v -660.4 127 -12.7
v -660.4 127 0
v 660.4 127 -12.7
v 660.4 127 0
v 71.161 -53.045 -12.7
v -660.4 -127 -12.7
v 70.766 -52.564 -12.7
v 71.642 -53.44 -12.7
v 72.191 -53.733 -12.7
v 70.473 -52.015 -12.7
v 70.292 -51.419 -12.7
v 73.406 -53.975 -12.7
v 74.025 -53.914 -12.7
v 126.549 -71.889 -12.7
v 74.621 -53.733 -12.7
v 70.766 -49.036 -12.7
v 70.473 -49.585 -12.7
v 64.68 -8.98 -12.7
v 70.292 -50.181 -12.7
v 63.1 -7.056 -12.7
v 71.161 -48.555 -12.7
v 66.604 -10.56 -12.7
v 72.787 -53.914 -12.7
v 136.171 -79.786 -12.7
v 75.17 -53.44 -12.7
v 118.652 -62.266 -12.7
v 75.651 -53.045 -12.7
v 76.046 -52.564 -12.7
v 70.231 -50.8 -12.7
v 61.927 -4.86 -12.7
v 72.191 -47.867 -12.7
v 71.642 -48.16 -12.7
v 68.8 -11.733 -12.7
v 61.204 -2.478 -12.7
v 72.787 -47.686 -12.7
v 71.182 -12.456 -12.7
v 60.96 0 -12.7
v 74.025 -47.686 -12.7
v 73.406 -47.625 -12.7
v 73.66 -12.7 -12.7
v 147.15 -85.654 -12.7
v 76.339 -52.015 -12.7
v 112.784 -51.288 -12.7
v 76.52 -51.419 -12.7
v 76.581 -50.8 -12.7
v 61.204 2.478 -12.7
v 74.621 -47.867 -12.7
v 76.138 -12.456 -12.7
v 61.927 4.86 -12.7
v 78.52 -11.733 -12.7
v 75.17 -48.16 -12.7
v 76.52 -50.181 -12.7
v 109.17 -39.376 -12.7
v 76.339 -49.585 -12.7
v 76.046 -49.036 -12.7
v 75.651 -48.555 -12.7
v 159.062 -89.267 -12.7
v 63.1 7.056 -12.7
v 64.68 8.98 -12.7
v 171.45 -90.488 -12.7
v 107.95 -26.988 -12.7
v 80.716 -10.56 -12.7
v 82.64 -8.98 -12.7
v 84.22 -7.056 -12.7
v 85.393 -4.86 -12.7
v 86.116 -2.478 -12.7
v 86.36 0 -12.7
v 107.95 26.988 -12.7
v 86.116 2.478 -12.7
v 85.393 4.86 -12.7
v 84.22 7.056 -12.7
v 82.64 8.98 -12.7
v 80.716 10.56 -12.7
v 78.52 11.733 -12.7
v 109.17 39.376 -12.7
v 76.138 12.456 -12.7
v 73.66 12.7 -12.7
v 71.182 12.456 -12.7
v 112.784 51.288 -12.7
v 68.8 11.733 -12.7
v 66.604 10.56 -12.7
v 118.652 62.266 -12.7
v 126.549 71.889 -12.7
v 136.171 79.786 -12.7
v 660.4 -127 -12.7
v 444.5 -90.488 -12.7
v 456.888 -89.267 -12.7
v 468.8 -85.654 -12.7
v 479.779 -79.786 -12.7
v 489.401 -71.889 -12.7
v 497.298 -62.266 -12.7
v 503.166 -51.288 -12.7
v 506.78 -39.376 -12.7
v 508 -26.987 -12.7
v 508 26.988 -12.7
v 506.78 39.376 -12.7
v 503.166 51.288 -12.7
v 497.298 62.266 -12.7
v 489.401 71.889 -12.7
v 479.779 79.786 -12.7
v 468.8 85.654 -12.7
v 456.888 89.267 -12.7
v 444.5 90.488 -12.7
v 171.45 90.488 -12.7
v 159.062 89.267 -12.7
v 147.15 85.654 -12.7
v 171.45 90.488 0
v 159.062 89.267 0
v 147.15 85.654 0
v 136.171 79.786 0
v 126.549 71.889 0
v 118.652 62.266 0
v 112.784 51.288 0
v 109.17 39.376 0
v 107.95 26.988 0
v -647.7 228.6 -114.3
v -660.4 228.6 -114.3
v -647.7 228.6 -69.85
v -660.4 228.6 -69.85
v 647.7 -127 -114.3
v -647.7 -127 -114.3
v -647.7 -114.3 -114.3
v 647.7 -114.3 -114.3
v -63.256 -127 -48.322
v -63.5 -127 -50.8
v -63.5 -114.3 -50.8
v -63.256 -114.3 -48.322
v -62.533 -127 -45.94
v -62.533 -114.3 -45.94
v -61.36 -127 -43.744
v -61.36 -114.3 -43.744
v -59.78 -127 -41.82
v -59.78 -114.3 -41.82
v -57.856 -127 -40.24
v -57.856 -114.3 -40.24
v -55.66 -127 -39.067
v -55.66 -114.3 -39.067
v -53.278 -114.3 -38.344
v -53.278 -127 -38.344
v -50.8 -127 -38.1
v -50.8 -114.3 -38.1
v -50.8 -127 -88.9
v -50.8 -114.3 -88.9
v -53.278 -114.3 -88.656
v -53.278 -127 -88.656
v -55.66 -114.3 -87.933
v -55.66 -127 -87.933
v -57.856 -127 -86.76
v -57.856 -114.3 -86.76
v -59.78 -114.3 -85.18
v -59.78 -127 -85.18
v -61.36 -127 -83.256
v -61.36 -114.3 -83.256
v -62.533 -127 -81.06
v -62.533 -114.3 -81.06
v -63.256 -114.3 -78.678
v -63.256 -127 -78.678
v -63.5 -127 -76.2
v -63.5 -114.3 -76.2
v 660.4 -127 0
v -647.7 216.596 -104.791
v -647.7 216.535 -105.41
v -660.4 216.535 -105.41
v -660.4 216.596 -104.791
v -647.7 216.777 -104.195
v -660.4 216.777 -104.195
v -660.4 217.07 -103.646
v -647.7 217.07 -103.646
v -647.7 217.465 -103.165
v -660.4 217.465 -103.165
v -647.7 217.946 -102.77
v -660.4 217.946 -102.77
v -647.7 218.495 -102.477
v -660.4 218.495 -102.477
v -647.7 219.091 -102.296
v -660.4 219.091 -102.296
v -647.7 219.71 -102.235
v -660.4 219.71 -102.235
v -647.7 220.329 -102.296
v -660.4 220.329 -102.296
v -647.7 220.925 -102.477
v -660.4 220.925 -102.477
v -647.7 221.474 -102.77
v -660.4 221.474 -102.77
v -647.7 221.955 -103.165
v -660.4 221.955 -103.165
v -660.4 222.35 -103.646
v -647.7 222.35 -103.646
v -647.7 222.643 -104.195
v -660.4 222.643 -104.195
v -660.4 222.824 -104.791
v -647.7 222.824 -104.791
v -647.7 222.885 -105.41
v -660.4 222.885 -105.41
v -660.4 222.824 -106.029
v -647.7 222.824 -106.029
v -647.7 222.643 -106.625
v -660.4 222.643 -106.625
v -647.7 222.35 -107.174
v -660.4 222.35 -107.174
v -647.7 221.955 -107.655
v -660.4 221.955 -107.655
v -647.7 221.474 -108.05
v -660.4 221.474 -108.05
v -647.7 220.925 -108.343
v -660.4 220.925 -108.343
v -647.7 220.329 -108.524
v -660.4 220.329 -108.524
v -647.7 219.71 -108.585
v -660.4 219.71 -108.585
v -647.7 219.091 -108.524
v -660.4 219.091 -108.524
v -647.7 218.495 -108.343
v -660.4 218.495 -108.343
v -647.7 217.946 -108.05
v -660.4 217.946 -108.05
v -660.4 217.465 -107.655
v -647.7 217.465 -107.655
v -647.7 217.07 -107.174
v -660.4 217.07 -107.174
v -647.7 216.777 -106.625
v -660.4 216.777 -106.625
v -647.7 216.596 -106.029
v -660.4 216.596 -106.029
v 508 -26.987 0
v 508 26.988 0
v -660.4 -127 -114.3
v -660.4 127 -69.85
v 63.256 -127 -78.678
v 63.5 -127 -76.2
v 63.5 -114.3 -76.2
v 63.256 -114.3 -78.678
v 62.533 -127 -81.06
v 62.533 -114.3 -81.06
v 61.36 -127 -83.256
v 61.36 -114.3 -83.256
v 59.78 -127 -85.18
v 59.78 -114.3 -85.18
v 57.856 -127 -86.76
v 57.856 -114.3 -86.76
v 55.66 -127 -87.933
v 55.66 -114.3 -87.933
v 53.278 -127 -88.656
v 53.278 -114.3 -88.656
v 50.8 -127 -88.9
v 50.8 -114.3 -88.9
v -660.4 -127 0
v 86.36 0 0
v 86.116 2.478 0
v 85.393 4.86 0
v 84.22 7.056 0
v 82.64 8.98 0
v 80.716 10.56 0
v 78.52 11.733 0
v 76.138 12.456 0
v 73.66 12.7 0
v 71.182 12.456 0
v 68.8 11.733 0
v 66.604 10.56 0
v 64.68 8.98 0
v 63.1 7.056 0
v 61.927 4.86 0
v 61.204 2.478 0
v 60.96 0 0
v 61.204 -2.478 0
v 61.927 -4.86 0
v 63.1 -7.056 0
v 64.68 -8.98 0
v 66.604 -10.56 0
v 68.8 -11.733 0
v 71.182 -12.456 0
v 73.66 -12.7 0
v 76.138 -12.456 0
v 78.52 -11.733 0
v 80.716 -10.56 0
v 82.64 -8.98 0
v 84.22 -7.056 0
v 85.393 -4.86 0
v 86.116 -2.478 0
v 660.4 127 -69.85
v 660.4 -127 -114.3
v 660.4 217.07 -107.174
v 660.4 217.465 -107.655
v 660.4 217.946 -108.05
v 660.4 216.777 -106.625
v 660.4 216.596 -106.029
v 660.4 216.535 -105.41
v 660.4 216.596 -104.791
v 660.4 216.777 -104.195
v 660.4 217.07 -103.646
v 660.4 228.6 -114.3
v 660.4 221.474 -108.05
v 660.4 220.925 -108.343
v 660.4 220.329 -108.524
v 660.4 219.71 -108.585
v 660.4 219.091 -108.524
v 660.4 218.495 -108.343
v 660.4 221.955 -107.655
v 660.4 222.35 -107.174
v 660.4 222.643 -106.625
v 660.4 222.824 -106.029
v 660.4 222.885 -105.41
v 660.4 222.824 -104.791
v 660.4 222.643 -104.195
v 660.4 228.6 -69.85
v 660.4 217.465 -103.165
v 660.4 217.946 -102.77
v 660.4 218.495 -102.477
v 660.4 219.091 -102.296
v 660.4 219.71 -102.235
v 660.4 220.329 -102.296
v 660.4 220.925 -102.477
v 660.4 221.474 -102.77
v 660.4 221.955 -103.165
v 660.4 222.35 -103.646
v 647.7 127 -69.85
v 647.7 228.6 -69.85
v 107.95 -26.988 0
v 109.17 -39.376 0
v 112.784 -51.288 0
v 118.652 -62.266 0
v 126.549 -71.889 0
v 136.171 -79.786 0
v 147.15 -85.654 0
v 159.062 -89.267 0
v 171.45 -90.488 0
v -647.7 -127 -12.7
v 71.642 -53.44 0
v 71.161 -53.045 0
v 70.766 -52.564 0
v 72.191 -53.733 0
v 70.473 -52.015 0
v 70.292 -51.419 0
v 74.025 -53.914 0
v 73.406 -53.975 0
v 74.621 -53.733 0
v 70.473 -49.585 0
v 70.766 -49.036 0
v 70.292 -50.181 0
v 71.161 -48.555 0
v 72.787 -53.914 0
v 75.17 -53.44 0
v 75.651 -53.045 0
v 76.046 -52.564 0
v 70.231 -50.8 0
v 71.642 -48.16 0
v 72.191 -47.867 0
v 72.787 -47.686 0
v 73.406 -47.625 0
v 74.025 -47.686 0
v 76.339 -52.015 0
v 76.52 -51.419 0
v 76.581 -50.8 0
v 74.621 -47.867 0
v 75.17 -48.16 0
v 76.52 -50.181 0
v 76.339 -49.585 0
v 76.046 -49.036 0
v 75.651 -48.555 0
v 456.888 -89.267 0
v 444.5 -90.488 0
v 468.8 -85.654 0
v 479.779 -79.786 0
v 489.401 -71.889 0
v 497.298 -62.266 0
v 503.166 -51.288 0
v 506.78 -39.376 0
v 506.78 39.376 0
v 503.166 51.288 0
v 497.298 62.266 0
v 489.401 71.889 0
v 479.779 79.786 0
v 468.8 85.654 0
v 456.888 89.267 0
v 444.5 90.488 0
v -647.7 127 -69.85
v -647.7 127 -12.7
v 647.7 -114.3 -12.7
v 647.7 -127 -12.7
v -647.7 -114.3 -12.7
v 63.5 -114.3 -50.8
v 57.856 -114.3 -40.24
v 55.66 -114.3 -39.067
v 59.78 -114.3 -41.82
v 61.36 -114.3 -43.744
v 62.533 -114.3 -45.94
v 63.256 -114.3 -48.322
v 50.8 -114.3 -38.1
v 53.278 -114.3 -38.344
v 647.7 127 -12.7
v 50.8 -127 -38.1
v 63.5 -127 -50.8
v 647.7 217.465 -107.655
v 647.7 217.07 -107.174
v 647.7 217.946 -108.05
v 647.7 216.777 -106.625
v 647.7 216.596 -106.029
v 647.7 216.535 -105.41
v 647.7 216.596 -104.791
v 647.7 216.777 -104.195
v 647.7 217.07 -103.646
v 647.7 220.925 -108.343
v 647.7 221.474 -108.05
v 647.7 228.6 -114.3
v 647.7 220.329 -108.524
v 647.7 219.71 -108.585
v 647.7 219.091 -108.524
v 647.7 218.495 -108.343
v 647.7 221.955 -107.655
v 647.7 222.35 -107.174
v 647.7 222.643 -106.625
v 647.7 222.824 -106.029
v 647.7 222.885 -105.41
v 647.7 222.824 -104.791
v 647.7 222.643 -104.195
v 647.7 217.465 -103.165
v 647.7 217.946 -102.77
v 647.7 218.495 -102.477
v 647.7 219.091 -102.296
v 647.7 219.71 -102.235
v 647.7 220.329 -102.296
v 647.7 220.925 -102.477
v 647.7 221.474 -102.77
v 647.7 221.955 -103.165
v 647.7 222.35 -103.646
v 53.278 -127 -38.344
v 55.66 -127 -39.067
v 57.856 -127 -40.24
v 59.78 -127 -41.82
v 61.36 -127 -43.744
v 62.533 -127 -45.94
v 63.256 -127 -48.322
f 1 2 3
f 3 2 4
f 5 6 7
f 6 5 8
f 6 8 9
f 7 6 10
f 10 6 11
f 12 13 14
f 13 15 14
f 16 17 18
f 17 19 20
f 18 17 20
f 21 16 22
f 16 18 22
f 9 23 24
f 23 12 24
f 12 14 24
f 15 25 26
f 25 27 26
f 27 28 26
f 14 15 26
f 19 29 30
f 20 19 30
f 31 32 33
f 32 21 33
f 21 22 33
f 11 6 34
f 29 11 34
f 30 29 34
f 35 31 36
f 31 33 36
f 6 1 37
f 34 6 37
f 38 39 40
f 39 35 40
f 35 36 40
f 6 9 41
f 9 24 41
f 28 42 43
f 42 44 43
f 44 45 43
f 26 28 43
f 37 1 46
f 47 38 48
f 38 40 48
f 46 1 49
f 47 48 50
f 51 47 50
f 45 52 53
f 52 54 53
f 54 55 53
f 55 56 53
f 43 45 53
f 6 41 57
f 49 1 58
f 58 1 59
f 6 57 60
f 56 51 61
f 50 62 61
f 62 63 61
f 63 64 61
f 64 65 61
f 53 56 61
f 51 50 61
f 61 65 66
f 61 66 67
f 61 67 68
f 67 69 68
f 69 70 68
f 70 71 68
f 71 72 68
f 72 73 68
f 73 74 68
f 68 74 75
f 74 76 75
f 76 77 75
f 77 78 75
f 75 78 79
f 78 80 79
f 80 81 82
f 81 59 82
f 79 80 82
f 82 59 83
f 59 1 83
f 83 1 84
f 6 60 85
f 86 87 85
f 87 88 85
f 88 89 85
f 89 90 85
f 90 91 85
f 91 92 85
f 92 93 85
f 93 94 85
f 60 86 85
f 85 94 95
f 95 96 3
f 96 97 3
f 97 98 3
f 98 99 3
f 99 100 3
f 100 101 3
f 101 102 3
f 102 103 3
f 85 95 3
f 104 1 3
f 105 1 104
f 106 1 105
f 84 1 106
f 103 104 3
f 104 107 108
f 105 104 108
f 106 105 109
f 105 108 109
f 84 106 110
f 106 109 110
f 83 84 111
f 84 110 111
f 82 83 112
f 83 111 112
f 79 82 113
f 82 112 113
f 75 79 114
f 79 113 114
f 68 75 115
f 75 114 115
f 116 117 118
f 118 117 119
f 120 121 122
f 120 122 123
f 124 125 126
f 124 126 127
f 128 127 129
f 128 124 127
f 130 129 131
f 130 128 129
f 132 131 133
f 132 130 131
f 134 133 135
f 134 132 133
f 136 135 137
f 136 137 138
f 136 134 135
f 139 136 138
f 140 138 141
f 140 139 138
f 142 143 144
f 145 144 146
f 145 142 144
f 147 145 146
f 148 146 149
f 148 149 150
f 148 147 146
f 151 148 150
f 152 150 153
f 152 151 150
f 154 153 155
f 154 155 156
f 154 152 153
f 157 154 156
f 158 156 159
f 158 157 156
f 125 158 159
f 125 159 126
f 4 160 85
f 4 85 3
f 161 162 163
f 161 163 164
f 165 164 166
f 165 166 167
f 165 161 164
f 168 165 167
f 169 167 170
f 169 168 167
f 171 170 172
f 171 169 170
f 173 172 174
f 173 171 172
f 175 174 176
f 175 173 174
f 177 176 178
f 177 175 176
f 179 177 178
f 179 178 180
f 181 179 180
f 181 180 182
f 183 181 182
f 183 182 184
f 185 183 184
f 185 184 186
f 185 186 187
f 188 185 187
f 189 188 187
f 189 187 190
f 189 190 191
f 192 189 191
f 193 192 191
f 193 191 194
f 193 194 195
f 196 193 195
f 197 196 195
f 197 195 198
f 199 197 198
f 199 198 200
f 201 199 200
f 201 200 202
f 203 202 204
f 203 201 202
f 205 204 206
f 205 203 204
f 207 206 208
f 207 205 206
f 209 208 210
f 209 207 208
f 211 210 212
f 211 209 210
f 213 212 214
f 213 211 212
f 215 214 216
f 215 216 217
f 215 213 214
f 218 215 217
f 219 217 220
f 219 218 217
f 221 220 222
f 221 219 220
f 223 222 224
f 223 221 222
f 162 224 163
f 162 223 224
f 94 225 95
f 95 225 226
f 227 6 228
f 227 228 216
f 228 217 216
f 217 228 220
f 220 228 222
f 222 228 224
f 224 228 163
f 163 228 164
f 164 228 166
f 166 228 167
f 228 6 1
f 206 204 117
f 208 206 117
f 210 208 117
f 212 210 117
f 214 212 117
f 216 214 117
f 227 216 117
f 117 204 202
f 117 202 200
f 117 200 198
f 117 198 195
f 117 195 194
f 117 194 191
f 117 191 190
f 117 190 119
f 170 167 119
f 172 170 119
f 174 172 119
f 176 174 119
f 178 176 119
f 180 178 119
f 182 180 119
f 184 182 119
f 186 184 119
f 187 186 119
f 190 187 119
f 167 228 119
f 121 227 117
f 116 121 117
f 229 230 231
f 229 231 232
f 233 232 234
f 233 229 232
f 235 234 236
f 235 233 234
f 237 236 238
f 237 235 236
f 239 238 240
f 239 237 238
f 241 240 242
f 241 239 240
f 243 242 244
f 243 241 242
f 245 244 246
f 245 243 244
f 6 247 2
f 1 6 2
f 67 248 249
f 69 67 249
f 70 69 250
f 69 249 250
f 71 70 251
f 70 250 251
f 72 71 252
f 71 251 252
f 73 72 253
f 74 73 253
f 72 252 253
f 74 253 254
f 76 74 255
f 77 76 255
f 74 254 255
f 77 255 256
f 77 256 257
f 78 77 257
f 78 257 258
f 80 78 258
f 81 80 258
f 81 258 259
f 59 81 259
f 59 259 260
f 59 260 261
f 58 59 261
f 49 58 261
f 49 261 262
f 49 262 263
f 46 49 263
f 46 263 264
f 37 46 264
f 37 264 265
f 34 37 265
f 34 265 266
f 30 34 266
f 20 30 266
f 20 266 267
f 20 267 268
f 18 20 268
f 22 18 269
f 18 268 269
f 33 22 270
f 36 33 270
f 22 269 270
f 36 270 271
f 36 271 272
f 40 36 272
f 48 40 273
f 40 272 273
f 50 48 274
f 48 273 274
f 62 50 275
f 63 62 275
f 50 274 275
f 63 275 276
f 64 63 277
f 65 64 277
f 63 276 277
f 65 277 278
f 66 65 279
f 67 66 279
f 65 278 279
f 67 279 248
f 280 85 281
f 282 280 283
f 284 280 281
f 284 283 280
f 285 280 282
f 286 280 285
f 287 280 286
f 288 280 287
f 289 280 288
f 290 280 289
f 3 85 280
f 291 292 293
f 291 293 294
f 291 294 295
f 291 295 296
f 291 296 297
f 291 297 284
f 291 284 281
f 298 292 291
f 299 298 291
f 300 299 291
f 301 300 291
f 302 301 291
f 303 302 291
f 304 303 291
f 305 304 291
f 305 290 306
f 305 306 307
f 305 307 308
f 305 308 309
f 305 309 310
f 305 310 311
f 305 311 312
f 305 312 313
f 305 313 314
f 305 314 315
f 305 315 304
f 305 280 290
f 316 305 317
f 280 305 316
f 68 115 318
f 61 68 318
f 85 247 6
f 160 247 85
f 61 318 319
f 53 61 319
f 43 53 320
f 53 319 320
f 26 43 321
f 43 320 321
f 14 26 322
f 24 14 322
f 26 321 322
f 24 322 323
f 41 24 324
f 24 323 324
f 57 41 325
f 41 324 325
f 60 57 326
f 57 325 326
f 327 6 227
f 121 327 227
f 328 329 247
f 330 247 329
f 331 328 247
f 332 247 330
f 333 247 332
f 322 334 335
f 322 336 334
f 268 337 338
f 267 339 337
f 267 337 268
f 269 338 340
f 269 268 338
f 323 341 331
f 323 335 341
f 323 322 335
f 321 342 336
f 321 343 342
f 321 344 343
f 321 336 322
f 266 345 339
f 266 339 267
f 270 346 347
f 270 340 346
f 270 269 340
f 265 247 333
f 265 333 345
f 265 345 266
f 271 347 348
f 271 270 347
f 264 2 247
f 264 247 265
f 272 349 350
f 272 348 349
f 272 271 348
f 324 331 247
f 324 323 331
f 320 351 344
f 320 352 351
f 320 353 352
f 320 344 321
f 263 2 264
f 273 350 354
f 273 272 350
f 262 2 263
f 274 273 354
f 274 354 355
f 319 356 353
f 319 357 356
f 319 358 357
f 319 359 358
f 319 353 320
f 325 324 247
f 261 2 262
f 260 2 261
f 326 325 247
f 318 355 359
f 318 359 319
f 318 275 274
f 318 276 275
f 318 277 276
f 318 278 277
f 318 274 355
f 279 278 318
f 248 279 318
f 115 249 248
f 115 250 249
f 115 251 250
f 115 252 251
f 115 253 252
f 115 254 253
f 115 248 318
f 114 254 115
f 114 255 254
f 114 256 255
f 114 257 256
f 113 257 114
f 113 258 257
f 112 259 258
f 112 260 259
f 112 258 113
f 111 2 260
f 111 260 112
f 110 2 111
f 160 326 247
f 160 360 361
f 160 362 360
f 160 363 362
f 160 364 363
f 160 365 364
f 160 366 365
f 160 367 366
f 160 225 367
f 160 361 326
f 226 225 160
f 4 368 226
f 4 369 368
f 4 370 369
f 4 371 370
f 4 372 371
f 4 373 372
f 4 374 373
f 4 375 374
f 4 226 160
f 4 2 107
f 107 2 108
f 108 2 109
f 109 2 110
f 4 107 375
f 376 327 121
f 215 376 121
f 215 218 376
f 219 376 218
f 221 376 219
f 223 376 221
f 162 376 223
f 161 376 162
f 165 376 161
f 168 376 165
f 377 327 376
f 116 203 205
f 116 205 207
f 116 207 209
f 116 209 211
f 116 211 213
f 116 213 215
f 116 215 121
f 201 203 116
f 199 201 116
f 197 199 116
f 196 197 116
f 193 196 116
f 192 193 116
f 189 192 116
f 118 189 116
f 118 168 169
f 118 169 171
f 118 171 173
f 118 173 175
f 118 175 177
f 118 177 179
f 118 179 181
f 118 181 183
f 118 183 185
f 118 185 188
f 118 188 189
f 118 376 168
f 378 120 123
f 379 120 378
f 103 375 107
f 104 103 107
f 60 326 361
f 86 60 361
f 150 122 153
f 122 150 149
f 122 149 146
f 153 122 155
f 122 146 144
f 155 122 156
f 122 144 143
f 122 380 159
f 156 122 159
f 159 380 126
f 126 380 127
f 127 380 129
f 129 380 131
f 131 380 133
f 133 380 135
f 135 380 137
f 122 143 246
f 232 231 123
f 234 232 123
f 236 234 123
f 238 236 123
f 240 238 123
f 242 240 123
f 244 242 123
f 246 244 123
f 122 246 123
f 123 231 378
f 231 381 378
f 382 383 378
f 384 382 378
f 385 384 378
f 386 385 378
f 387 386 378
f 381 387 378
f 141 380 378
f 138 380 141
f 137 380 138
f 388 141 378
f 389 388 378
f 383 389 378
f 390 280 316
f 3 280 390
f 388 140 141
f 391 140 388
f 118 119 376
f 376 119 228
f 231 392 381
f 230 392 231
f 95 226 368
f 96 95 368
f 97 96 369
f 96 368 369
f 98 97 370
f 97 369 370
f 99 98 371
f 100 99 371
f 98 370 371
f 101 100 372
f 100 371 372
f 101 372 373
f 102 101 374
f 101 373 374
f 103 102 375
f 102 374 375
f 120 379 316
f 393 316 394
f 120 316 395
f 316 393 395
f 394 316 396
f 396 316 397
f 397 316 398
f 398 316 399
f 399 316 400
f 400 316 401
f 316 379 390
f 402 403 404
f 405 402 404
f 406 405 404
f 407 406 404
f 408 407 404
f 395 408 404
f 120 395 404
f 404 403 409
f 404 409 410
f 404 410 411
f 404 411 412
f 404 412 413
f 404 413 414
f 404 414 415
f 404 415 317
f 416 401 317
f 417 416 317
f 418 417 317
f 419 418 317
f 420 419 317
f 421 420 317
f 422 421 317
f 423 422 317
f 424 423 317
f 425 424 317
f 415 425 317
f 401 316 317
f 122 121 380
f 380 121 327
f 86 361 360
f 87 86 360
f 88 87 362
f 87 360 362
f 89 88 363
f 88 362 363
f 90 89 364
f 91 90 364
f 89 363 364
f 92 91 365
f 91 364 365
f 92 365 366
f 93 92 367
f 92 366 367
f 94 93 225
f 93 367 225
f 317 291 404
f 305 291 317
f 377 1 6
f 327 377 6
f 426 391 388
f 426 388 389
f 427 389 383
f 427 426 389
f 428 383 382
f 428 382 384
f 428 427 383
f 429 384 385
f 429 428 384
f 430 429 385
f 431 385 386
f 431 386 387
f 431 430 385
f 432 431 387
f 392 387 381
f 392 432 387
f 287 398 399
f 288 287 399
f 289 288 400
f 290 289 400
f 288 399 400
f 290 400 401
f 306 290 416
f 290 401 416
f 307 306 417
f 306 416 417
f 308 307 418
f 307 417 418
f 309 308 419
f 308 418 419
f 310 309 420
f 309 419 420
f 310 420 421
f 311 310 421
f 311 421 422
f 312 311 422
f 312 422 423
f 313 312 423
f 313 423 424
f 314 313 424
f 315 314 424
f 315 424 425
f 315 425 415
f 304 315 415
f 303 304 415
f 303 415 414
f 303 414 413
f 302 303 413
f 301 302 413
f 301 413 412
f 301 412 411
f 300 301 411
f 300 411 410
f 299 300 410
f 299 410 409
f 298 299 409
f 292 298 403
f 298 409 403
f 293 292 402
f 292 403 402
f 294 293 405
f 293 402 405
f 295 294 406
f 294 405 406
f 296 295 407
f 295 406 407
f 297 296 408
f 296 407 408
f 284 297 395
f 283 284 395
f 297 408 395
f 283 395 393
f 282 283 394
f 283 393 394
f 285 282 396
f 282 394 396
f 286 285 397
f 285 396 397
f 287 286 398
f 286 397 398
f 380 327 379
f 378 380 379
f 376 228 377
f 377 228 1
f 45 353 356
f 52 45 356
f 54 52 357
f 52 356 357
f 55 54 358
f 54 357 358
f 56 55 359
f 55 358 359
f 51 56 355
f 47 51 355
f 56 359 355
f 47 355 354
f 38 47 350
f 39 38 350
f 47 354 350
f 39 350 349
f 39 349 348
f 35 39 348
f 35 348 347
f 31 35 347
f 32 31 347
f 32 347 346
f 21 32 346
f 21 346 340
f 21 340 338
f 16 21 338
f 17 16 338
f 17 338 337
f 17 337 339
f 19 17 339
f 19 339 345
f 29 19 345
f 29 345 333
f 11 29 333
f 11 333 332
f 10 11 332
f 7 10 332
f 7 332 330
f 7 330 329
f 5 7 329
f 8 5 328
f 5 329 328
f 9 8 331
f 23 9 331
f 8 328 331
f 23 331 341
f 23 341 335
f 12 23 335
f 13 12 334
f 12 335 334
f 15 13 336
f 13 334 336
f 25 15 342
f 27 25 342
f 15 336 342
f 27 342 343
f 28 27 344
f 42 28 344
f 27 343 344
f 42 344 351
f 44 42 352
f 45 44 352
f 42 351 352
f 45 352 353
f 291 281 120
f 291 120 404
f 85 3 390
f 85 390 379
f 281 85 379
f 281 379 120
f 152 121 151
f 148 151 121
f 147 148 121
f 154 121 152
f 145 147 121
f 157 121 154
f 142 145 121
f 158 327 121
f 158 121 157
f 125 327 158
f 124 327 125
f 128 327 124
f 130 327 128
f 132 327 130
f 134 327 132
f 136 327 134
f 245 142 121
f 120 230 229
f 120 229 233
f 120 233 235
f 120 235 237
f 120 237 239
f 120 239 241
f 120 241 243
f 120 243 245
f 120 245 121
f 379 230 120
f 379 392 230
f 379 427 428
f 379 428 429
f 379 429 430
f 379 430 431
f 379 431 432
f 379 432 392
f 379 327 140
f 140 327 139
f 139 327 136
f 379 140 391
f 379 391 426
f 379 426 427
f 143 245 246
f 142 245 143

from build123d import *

# Parameters (mm, degrees)
F0_W      = 1320.8
F0_H      = 254
F1_DEPTH  = 12.7
F4_DEPTH  = 12.7
F5_D      = 6.35
F8_DEPTH  = 114.301
F9_R      = 12.7
F9_R_2    = 3.175
F10_DEPTH = 114.301
F12_W     = 1295.4
F12_H     = 101.6
F13_DEPTH = 12.7


with BuildPart() as f1:
    # F0 (on Top) → F1 (new body)
    with BuildSketch(Plane.XY):
        Rectangle(F0_W, F0_H)
    extrude(amount=-F1_DEPTH)

    # F7 (on Top) → F8 (cut, through all)
    with BuildSketch(Plane.XY):
        with BuildLine():
            ThreePointArc((508, 26.9875), (489.4012806053, 71.8887806053), (444.5, 90.4875))
            Line((444.5, 90.4875), (171.45, 90.4875))
            ThreePointArc((171.45, 90.4875), (126.5487193947, 71.8887806053), (107.95, 26.9875))
            Line((107.95, 26.9875), (107.95, -26.9875))
            ThreePointArc((107.95, -26.9875), (126.5487193947, -71.8887806053), (171.45, -90.4875))
            Line((171.45, -90.4875), (444.5, -90.4875))
            ThreePointArc((444.5, -90.4875), (489.4012806053, -71.8887806053), (508, -26.9875))
            Line((508, -26.9875), (508, 26.9875))
        make_face()
    extrude(amount=-F8_DEPTH, mode=Mode.SUBTRACT)

    # F9 (on Top) → F10 (cut, through all)
    with BuildSketch(Plane.XY):
        with Locations((73.66, 0)):
            Circle(F9_R)
        with Locations((73.406, -50.8)):
            Circle(F9_R_2)
    extrude(amount=-F10_DEPTH, mode=Mode.SUBTRACT)


with BuildPart() as f4:
    # F3 (on offset) → F4 (new body)
    with BuildSketch(Plane.YZ.offset(660.4)):
        Polygon((-127, -12.7), (-127, -114.3), (228.6, -114.3), (228.6, -69.85), (127, -69.85), (127, -12.7), (0, -12.7), align=None)
    extrude(amount=-F4_DEPTH)

    # F5 (through all)
    with Locations(Plane.YZ.offset(660.4)):
        with Locations((219.71, -105.41)):
            Hole(F5_D / 2)


with BuildPart() as f6_1:
    # F6: instance of F4
    add(f4.part.mirror(Plane.YZ))


with BuildPart() as f13:
    # F12 (on offset) → F13 (new body)
    with BuildSketch(Plane.XZ.offset(127)):
        with Locations((0, -63.5)):
            Rectangle(F12_W, F12_H)
        with BuildLine():
            ThreePointArc((63.5, -76.2), (59.7802561211, -85.1802561211), (50.8, -88.9))
            Line((50.8, -88.9), (-50.8, -88.9))
            ThreePointArc((-50.8, -88.9), (-59.7802561211, -85.1802561211), (-63.5, -76.2))
            Line((-63.5, -76.2), (-63.5, -50.8))
            ThreePointArc((-63.5, -50.8), (-59.7802561211, -41.8197438789), (-50.8, -38.1))
            Line((-50.8, -38.1), (50.8, -38.1))
            ThreePointArc((50.8, -38.1), (59.7802561211, -41.8197438789), (63.5, -50.8))
            Line((63.5, -50.8), (63.5, -76.2))
        make_face(mode=Mode.SUBTRACT)
    extrude(amount=-F13_DEPTH)


solid = Compound([f1.part, f4.part, f6_1.part, f13.part])
